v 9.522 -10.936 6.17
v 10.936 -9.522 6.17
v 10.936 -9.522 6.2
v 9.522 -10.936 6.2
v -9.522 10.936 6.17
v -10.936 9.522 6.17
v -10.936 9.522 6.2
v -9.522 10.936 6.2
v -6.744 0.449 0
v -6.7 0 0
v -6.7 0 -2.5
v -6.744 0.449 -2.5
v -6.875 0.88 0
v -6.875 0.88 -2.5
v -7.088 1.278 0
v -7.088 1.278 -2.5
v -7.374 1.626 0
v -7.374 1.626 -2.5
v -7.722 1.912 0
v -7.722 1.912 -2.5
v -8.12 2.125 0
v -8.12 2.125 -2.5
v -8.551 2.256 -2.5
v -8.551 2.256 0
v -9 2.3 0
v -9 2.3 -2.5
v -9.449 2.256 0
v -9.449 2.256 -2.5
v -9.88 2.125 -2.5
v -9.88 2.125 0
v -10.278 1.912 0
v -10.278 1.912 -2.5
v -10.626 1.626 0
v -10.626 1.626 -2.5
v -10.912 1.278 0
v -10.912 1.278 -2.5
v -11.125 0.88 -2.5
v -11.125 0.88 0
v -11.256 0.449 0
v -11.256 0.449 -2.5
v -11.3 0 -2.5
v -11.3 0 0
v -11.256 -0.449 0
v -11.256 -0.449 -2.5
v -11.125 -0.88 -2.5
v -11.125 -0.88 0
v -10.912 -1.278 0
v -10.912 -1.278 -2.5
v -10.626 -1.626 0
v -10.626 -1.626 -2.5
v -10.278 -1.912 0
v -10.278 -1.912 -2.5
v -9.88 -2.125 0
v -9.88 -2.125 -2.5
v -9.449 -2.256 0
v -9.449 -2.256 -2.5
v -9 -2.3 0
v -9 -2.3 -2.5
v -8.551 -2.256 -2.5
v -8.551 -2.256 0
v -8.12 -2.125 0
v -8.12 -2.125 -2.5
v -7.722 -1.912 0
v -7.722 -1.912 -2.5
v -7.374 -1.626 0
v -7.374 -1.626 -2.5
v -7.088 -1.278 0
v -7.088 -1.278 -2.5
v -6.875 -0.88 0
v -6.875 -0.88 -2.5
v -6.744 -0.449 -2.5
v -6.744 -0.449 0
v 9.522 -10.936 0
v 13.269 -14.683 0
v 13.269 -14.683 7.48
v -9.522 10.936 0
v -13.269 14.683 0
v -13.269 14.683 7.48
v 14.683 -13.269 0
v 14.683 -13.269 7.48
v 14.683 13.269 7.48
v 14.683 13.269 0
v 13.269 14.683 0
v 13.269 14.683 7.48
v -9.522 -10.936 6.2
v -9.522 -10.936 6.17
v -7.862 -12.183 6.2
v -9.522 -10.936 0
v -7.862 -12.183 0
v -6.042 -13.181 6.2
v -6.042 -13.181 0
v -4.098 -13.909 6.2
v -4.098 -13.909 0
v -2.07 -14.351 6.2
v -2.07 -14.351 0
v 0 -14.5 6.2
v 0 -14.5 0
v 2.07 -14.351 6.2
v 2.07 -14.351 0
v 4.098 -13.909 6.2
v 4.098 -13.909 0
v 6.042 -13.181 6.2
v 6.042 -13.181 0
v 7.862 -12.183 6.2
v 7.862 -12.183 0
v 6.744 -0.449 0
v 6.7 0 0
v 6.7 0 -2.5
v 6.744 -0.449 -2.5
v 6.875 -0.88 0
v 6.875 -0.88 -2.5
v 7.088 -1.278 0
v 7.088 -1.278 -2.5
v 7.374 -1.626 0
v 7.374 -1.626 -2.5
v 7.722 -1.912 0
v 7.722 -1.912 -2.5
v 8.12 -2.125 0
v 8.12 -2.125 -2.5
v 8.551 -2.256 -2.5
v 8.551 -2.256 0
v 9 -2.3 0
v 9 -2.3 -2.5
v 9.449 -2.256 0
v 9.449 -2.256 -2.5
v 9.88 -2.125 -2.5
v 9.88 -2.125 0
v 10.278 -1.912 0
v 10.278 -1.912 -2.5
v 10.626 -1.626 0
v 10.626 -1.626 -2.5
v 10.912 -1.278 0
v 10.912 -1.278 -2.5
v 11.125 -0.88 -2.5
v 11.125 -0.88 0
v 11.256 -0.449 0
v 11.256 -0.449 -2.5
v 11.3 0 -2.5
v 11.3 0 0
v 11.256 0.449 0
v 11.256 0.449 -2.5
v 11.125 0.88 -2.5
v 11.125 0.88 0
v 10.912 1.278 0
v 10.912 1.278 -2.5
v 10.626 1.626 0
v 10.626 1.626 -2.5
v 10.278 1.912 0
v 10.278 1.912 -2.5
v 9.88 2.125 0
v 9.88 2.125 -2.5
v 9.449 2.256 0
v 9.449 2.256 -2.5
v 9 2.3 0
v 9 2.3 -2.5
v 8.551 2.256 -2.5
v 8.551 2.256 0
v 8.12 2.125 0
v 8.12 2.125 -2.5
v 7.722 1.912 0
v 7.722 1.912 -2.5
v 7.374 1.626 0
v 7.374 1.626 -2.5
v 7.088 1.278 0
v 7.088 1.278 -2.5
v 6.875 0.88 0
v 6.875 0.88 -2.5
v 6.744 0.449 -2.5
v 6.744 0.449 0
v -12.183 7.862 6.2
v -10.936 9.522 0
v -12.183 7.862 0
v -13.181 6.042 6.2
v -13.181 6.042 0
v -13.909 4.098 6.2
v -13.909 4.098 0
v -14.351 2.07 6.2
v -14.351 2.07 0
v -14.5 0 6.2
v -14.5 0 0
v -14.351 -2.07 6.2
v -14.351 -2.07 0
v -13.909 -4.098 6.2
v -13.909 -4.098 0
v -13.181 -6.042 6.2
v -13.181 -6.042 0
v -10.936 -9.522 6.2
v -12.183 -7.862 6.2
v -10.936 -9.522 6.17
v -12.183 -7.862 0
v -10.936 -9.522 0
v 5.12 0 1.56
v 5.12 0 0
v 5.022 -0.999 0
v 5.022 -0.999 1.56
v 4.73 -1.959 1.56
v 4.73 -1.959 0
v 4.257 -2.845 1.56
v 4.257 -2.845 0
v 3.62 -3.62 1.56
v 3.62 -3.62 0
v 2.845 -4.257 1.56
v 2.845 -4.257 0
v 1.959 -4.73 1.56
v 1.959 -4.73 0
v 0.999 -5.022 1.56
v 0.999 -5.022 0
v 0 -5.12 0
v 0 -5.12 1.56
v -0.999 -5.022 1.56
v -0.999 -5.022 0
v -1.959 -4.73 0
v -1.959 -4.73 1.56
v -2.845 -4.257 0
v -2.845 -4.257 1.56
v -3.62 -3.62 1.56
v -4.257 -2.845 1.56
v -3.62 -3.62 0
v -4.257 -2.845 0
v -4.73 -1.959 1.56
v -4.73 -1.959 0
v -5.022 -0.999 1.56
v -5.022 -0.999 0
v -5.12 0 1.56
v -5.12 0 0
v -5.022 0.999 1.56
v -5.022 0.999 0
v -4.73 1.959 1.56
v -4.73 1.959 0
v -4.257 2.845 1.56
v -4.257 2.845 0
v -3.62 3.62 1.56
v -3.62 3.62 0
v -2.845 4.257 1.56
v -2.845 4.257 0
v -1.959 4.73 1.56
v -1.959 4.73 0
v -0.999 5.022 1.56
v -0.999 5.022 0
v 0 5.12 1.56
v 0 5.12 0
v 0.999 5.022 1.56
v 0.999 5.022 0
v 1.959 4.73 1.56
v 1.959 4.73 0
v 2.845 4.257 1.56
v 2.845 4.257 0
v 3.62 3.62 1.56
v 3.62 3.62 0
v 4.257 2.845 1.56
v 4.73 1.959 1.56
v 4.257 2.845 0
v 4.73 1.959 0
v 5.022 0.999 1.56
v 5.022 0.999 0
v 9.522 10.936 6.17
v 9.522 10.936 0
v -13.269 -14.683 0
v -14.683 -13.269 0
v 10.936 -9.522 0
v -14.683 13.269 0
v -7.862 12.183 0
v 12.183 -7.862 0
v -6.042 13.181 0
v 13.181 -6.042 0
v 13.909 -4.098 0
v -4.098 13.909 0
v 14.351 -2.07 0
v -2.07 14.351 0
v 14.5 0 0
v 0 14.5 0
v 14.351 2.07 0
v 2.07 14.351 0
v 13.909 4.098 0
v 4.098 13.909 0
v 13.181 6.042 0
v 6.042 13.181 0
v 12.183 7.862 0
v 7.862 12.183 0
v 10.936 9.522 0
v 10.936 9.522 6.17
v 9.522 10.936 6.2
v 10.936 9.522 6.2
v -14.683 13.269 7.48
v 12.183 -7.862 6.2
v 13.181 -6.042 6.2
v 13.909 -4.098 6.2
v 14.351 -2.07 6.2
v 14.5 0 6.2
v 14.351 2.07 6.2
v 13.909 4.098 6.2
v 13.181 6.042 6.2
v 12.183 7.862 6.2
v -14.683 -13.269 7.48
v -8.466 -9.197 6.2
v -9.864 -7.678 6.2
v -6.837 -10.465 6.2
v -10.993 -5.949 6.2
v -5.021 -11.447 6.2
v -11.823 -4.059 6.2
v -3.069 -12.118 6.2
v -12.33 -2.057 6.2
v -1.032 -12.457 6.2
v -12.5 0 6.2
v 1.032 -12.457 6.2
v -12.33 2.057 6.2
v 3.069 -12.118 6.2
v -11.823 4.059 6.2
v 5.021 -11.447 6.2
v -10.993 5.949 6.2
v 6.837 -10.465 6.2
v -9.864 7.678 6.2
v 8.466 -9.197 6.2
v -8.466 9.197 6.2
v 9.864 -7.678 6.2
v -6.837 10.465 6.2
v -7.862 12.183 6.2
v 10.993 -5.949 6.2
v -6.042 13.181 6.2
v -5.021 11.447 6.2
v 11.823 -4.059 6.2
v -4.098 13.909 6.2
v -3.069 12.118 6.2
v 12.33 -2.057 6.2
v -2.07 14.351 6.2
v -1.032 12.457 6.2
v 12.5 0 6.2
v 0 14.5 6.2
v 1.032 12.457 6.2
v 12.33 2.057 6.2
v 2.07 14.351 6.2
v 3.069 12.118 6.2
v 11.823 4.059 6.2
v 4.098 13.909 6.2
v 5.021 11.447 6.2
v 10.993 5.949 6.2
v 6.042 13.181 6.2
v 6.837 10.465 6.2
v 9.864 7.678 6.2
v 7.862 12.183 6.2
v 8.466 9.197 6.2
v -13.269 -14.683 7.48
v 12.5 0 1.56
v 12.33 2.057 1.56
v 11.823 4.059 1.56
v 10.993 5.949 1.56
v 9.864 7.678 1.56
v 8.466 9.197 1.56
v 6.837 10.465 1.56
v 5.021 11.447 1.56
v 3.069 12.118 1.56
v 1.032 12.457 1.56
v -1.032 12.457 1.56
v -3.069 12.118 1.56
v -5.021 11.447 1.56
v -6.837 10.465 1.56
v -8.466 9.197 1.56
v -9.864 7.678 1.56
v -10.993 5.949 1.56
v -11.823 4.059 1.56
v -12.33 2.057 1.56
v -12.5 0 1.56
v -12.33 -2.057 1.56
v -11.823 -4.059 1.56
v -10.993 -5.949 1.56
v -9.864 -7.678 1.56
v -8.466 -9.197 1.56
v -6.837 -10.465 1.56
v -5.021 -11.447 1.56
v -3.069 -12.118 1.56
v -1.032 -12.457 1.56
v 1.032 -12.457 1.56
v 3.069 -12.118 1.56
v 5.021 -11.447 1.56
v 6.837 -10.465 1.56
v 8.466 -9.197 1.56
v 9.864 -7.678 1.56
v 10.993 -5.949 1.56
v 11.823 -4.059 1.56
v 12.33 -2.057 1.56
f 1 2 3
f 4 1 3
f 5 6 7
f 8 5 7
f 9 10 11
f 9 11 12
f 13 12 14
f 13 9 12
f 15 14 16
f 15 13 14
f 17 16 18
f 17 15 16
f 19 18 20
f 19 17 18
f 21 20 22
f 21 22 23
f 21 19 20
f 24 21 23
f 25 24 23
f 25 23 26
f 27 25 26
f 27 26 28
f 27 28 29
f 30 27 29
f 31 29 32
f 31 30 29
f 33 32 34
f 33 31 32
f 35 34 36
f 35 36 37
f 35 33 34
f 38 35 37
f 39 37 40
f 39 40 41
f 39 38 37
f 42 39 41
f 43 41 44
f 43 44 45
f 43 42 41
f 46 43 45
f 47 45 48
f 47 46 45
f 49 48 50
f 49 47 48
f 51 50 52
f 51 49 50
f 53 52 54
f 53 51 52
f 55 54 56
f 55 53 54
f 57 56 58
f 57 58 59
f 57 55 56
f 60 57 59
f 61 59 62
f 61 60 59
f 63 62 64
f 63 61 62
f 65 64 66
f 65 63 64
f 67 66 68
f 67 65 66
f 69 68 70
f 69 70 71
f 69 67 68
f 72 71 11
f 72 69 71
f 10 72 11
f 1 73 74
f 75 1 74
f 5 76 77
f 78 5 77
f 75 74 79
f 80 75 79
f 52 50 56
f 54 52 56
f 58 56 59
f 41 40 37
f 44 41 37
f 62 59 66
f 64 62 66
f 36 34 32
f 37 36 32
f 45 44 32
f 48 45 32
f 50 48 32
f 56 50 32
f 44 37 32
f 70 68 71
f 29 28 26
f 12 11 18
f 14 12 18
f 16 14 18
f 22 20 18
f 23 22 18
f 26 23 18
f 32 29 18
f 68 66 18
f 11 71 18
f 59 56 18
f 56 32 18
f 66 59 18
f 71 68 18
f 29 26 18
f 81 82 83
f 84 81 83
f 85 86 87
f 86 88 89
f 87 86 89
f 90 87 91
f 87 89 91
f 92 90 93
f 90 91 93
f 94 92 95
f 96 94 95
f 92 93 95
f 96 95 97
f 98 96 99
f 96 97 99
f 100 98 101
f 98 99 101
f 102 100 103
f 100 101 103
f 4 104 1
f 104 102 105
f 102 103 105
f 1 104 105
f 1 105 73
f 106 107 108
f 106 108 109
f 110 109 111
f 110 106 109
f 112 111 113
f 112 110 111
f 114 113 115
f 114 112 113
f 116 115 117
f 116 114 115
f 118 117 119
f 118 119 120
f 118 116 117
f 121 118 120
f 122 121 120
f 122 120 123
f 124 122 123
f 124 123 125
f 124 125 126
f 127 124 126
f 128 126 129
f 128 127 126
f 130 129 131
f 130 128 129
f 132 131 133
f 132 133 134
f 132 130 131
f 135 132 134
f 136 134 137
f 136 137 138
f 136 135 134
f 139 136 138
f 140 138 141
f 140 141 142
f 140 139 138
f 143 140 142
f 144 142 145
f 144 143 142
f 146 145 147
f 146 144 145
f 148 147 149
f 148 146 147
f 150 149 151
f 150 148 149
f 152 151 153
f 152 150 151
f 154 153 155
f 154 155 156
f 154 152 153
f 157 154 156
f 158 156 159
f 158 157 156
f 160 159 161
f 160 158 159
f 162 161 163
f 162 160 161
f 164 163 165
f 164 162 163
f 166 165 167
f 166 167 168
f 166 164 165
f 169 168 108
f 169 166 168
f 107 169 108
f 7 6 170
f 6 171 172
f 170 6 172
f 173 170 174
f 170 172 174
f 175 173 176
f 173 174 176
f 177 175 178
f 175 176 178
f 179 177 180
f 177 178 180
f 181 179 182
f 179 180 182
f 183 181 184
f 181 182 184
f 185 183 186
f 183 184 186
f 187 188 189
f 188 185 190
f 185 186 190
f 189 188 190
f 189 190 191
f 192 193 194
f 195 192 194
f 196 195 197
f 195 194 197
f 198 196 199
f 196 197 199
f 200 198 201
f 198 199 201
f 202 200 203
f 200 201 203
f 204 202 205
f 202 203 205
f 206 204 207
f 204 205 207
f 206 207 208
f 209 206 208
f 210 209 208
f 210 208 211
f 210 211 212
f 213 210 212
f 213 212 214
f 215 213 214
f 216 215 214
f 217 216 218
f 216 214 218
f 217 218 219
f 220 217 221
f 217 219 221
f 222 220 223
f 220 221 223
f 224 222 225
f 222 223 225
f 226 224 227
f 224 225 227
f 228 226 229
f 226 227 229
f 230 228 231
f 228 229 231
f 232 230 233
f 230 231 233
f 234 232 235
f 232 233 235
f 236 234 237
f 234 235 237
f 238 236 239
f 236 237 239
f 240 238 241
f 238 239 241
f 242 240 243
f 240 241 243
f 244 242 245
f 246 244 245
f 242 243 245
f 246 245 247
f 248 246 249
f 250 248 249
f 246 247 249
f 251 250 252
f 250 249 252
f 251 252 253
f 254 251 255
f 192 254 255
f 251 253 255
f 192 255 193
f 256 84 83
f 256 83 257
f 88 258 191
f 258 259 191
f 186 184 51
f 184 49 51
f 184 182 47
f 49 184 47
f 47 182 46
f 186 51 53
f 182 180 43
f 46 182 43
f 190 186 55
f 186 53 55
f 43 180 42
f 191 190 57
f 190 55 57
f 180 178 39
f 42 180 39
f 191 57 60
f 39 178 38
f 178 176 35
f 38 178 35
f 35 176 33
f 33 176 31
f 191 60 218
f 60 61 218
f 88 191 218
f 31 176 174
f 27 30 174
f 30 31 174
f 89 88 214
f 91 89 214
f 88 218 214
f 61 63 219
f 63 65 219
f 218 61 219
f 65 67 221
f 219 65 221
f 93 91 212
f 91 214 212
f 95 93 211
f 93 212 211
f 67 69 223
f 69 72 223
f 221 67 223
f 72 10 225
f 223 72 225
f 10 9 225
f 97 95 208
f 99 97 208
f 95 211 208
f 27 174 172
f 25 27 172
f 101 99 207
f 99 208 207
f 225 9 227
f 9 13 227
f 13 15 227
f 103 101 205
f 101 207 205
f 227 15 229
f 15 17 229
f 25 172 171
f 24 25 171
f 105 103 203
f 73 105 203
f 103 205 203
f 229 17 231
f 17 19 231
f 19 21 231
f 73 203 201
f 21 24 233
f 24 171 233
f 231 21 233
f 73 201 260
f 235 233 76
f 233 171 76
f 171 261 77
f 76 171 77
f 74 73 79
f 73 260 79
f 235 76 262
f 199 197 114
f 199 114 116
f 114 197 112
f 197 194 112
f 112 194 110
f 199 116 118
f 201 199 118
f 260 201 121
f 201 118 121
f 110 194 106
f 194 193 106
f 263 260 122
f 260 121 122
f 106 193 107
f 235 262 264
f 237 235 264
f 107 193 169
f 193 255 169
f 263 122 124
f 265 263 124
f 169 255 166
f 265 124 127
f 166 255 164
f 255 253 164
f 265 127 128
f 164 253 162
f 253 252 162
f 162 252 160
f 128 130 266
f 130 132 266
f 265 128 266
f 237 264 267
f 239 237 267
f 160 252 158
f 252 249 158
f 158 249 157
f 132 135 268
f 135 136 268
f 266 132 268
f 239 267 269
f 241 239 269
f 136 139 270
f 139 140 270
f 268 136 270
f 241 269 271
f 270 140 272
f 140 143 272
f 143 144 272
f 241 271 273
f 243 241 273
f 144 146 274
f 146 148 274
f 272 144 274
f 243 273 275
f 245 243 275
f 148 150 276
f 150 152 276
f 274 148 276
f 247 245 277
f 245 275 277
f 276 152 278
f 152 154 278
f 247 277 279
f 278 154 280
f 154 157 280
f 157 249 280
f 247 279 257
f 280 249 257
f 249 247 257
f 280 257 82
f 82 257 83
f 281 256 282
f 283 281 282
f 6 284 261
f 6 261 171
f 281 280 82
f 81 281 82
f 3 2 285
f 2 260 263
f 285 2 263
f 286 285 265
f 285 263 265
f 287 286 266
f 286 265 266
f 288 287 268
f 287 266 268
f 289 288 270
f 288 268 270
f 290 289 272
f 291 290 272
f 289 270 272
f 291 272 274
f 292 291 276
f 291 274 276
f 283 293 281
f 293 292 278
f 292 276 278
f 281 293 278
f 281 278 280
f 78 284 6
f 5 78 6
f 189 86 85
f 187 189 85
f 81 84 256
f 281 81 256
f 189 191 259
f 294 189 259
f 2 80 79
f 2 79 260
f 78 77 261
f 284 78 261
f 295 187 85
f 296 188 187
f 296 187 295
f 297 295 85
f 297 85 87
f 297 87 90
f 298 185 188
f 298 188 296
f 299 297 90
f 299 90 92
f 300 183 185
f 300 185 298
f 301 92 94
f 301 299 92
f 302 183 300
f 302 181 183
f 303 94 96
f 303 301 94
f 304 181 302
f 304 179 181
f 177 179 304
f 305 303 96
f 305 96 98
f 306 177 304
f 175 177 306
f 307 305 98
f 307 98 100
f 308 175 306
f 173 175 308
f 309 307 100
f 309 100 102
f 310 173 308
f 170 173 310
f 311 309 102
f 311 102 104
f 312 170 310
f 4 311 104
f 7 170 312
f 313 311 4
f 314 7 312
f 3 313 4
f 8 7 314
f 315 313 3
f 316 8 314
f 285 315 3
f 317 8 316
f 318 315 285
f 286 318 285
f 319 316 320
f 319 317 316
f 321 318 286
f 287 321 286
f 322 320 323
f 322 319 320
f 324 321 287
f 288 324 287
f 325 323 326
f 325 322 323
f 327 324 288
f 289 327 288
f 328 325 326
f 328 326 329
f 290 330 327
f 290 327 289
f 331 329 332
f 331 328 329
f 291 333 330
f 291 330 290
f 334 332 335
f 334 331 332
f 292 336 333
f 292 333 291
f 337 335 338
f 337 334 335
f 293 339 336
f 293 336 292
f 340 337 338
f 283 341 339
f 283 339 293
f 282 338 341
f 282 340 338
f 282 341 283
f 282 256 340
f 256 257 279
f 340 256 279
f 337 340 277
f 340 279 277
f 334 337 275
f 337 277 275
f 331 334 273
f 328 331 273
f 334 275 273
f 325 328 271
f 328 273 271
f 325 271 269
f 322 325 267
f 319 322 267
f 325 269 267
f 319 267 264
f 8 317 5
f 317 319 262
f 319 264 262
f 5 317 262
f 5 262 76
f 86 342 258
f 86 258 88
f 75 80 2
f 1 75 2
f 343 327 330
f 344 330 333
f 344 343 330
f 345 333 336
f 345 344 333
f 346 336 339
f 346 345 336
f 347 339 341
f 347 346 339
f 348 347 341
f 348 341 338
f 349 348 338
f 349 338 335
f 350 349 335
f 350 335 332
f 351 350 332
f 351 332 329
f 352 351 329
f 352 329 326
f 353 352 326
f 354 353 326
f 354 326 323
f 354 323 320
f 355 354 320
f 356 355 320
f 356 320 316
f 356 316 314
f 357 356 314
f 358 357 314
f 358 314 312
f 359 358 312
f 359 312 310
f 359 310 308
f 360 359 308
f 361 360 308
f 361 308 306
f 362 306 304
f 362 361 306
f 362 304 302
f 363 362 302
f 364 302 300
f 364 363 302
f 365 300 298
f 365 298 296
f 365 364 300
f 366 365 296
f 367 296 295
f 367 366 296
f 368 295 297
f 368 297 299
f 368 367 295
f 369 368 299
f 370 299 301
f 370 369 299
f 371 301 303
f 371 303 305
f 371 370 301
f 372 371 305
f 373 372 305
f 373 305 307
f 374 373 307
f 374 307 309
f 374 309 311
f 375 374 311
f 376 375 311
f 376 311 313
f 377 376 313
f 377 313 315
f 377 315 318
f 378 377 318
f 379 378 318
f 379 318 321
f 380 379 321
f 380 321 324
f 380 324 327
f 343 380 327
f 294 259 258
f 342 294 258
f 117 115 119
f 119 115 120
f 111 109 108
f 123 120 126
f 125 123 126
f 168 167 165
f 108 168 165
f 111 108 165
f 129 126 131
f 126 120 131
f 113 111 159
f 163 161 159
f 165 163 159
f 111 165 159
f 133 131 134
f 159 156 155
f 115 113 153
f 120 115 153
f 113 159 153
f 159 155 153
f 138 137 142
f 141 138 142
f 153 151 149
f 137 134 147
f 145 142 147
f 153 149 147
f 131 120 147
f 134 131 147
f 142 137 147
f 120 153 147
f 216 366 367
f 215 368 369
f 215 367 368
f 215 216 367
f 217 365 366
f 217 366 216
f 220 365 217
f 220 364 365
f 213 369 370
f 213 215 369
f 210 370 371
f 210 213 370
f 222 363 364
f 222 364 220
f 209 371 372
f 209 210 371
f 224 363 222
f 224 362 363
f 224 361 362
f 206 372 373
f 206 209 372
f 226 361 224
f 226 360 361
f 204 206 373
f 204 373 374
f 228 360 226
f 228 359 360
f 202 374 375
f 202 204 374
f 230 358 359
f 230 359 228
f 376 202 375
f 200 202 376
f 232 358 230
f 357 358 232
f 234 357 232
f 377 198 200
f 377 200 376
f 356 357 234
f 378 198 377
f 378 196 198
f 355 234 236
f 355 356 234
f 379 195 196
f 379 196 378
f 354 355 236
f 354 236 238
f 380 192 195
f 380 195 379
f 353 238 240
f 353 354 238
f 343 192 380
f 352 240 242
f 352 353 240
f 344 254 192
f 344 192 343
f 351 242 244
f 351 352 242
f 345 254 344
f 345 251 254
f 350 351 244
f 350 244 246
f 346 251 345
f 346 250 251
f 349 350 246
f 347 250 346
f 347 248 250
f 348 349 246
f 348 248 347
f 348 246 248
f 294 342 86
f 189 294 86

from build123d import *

# Parameters (mm, degrees)
F0_R     = 12.5
F0_R_2   = 2.3
F1_DEPTH = 1.56
F2_DEPTH = 6.2
F3_DEPTH = 7.48
F4_DEPTH = 2.5
F6_DEPTH = 5
F7_COUNT = 4


with BuildPart() as f1:
    # F0 (on Top) → F1 (new body)
    with BuildSketch(Plane.XY):
        with BuildLine():
            ThreePointArc((10.9357430539, -9.5215294916), (13.5797325872, -5.083390882), (14.5, 0))
            ThreePointArc((14.5, 0), (13.5797325872, 5.083390882), (10.9357430539, 9.5215294916))
            ThreePointArc((10.9357430539, 9.5215294916), (10.2530483272, 10.2530483272), (9.5215294916, 10.9357430539))
            ThreePointArc((9.5215294916, 10.9357430539), (0, 14.5), (-9.5215294916, 10.9357430539))
            ThreePointArc((-9.5215294916, 10.9357430539), (-10.2530483272, 10.2530483272), (-10.9357430539, 9.5215294916))
            ThreePointArc((-10.9357430539, 9.5215294916), (-14.5, 0), (-10.9357430539, -9.5215294916))
            ThreePointArc((-10.9357430539, -9.5215294916), (-10.2530483272, -10.2530483272), (-9.5215294916, -10.9357430539))
            ThreePointArc((-9.5215294916, -10.9357430539), (0, -14.5), (9.5215294916, -10.9357430539))
            ThreePointArc((9.5215294916, -10.9357430539), (10.2530483272, -10.2530483272), (10.9357430539, -9.5215294916))
        make_face()
        Circle(F0_R, mode=Mode.SUBTRACT)
        Circle(F0_R)
        with Locations((-9, 0)):
            Circle(F0_R_2, mode=Mode.SUBTRACT)
        with BuildLine():
            ThreePointArc((-5.12, 0), (0, 5.12), (5.12, 0))
            ThreePointArc((5.12, 0), (0, -5.12), (-5.12, 0))
        make_face(mode=Mode.SUBTRACT)
        with BuildLine():
            ThreePointArc((11.3, 0), (9, -2.3), (6.7, 0))
            ThreePointArc((6.7, 0), (9, 2.3), (11.3, 0))
        make_face(mode=Mode.SUBTRACT)
        with Locations((-9, 0)):
            Circle(F0_R_2)
        with BuildLine():
            ThreePointArc((11.3, 0), (9, 2.3), (6.7, 0))
            ThreePointArc((6.7, 0), (9, -2.3), (11.3, 0))
        make_face()
    extrude(amount=F1_DEPTH)

    # F0 (on Top) → F2 (join)
    with BuildSketch(Plane.XY):
        with BuildLine():
            ThreePointArc((10.9357430539, -9.5215294916), (13.5797325872, -5.083390882), (14.5, 0))
            ThreePointArc((14.5, 0), (13.5797325872, 5.083390882), (10.9357430539, 9.5215294916))
            ThreePointArc((10.9357430539, 9.5215294916), (10.2530483272, 10.2530483272), (9.5215294916, 10.9357430539))
            ThreePointArc((9.5215294916, 10.9357430539), (0, 14.5), (-9.5215294916, 10.9357430539))
            ThreePointArc((-9.5215294916, 10.9357430539), (-10.2530483272, 10.2530483272), (-10.9357430539, 9.5215294916))
            ThreePointArc((-10.9357430539, 9.5215294916), (-14.5, 0), (-10.9357430539, -9.5215294916))
            ThreePointArc((-10.9357430539, -9.5215294916), (-10.2530483272, -10.2530483272), (-9.5215294916, -10.9357430539))
            ThreePointArc((-9.5215294916, -10.9357430539), (0, -14.5), (9.5215294916, -10.9357430539))
            ThreePointArc((9.5215294916, -10.9357430539), (10.2530483272, -10.2530483272), (10.9357430539, -9.5215294916))
        make_face()
        Circle(F0_R, mode=Mode.SUBTRACT)
    extrude(amount=F2_DEPTH)

    # F0 (on Top) → F3 (join)
    with BuildSketch(Plane.XY):
        with BuildLine():
            Line((-13.2691954318, -14.6834089942), (-9.5215294916, -10.9357430539))
            ThreePointArc((-9.5215294916, -10.9357430539), (-10.2530483272, -10.2530483272), (-10.9357430539, -9.5215294916))
            Line((-10.9357430539, -9.5215294916), (-14.6834089942, -13.2691954318))
            Line((-14.6834089942, -13.2691954318), (-13.2691954318, -14.6834089942))
        make_face()
        with BuildLine():
            ThreePointArc((-10.9357430539, 9.5215294916), (-10.2530483272, 10.2530483272), (-9.5215294916, 10.9357430539))
            Line((-9.5215294916, 10.9357430539), (-13.2691954318, 14.6834089942))
            Line((-13.2691954318, 14.6834089942), (-14.6834089942, 13.2691954318))
            Line((-14.6834089942, 13.2691954318), (-10.9357430539, 9.5215294916))
        make_face()
        with BuildLine():
            ThreePointArc((9.5215294916, 10.9357430539), (10.2530483272, 10.2530483272), (10.9357430539, 9.5215294916))
            Line((10.9357430539, 9.5215294916), (14.6834089942, 13.2691954318))
            Line((14.6834089942, 13.2691954318), (13.2691954318, 14.6834089942))
            Line((13.2691954318, 14.6834089942), (9.5215294916, 10.9357430539))
        make_face()
        with BuildLine():
            Line((14.6834089942, -13.2691954318), (10.9357430539, -9.5215294916))
            ThreePointArc((10.9357430539, -9.5215294916), (10.2530483272, -10.2530483272), (9.5215294916, -10.9357430539))
            Line((9.5215294916, -10.9357430539), (13.2691954318, -14.6834089942))
            Line((13.2691954318, -14.6834089942), (14.6834089942, -13.2691954318))
        make_face()
    extrude(amount=F3_DEPTH)

    # F0 (on Top) → F4 (join)
    with BuildSketch(Plane.XY):
        with Locations((-9, 0)):
            Circle(F0_R_2)
        with BuildLine():
            ThreePointArc((11.3, 0), (9, 2.3), (6.7, 0))
            ThreePointArc((6.7, 0), (9, -2.3), (11.3, 0))
        make_face()
    extrude(amount=-F4_DEPTH)

    # F7: F6 ×4 about axis
    f7_axis = Axis((0, 0, 6.2), (0, 0, 1))


with BuildPart() as f6:
    # F5 (on face) → F6 (new body)
    with BuildSketch(Plane(origin=(0.7071067812, -0.7071067812, 0), x_dir=(0.7071067812, 0.7071067812, 0), z_dir=(0.7071067812, -0.7071067812, 0))):
        Polygon((-14.4654761415, 7.48), (-19.7654761415, 7.48), (-14.4654761415, 6.17), (-14.4654761415, 6.2), align=None)
    extrude(amount=-F6_DEPTH)


with BuildPart() as f1_1:
    add(f1.part)
    for i in range(1, F7_COUNT):
        add(f6.part.rotate(f7_axis, i * 360 / F7_COUNT), mode=Mode.SUBTRACT)

    # F7#seed: cut F6
    add(f6.part, mode=Mode.SUBTRACT)


solid = f1_1.part
